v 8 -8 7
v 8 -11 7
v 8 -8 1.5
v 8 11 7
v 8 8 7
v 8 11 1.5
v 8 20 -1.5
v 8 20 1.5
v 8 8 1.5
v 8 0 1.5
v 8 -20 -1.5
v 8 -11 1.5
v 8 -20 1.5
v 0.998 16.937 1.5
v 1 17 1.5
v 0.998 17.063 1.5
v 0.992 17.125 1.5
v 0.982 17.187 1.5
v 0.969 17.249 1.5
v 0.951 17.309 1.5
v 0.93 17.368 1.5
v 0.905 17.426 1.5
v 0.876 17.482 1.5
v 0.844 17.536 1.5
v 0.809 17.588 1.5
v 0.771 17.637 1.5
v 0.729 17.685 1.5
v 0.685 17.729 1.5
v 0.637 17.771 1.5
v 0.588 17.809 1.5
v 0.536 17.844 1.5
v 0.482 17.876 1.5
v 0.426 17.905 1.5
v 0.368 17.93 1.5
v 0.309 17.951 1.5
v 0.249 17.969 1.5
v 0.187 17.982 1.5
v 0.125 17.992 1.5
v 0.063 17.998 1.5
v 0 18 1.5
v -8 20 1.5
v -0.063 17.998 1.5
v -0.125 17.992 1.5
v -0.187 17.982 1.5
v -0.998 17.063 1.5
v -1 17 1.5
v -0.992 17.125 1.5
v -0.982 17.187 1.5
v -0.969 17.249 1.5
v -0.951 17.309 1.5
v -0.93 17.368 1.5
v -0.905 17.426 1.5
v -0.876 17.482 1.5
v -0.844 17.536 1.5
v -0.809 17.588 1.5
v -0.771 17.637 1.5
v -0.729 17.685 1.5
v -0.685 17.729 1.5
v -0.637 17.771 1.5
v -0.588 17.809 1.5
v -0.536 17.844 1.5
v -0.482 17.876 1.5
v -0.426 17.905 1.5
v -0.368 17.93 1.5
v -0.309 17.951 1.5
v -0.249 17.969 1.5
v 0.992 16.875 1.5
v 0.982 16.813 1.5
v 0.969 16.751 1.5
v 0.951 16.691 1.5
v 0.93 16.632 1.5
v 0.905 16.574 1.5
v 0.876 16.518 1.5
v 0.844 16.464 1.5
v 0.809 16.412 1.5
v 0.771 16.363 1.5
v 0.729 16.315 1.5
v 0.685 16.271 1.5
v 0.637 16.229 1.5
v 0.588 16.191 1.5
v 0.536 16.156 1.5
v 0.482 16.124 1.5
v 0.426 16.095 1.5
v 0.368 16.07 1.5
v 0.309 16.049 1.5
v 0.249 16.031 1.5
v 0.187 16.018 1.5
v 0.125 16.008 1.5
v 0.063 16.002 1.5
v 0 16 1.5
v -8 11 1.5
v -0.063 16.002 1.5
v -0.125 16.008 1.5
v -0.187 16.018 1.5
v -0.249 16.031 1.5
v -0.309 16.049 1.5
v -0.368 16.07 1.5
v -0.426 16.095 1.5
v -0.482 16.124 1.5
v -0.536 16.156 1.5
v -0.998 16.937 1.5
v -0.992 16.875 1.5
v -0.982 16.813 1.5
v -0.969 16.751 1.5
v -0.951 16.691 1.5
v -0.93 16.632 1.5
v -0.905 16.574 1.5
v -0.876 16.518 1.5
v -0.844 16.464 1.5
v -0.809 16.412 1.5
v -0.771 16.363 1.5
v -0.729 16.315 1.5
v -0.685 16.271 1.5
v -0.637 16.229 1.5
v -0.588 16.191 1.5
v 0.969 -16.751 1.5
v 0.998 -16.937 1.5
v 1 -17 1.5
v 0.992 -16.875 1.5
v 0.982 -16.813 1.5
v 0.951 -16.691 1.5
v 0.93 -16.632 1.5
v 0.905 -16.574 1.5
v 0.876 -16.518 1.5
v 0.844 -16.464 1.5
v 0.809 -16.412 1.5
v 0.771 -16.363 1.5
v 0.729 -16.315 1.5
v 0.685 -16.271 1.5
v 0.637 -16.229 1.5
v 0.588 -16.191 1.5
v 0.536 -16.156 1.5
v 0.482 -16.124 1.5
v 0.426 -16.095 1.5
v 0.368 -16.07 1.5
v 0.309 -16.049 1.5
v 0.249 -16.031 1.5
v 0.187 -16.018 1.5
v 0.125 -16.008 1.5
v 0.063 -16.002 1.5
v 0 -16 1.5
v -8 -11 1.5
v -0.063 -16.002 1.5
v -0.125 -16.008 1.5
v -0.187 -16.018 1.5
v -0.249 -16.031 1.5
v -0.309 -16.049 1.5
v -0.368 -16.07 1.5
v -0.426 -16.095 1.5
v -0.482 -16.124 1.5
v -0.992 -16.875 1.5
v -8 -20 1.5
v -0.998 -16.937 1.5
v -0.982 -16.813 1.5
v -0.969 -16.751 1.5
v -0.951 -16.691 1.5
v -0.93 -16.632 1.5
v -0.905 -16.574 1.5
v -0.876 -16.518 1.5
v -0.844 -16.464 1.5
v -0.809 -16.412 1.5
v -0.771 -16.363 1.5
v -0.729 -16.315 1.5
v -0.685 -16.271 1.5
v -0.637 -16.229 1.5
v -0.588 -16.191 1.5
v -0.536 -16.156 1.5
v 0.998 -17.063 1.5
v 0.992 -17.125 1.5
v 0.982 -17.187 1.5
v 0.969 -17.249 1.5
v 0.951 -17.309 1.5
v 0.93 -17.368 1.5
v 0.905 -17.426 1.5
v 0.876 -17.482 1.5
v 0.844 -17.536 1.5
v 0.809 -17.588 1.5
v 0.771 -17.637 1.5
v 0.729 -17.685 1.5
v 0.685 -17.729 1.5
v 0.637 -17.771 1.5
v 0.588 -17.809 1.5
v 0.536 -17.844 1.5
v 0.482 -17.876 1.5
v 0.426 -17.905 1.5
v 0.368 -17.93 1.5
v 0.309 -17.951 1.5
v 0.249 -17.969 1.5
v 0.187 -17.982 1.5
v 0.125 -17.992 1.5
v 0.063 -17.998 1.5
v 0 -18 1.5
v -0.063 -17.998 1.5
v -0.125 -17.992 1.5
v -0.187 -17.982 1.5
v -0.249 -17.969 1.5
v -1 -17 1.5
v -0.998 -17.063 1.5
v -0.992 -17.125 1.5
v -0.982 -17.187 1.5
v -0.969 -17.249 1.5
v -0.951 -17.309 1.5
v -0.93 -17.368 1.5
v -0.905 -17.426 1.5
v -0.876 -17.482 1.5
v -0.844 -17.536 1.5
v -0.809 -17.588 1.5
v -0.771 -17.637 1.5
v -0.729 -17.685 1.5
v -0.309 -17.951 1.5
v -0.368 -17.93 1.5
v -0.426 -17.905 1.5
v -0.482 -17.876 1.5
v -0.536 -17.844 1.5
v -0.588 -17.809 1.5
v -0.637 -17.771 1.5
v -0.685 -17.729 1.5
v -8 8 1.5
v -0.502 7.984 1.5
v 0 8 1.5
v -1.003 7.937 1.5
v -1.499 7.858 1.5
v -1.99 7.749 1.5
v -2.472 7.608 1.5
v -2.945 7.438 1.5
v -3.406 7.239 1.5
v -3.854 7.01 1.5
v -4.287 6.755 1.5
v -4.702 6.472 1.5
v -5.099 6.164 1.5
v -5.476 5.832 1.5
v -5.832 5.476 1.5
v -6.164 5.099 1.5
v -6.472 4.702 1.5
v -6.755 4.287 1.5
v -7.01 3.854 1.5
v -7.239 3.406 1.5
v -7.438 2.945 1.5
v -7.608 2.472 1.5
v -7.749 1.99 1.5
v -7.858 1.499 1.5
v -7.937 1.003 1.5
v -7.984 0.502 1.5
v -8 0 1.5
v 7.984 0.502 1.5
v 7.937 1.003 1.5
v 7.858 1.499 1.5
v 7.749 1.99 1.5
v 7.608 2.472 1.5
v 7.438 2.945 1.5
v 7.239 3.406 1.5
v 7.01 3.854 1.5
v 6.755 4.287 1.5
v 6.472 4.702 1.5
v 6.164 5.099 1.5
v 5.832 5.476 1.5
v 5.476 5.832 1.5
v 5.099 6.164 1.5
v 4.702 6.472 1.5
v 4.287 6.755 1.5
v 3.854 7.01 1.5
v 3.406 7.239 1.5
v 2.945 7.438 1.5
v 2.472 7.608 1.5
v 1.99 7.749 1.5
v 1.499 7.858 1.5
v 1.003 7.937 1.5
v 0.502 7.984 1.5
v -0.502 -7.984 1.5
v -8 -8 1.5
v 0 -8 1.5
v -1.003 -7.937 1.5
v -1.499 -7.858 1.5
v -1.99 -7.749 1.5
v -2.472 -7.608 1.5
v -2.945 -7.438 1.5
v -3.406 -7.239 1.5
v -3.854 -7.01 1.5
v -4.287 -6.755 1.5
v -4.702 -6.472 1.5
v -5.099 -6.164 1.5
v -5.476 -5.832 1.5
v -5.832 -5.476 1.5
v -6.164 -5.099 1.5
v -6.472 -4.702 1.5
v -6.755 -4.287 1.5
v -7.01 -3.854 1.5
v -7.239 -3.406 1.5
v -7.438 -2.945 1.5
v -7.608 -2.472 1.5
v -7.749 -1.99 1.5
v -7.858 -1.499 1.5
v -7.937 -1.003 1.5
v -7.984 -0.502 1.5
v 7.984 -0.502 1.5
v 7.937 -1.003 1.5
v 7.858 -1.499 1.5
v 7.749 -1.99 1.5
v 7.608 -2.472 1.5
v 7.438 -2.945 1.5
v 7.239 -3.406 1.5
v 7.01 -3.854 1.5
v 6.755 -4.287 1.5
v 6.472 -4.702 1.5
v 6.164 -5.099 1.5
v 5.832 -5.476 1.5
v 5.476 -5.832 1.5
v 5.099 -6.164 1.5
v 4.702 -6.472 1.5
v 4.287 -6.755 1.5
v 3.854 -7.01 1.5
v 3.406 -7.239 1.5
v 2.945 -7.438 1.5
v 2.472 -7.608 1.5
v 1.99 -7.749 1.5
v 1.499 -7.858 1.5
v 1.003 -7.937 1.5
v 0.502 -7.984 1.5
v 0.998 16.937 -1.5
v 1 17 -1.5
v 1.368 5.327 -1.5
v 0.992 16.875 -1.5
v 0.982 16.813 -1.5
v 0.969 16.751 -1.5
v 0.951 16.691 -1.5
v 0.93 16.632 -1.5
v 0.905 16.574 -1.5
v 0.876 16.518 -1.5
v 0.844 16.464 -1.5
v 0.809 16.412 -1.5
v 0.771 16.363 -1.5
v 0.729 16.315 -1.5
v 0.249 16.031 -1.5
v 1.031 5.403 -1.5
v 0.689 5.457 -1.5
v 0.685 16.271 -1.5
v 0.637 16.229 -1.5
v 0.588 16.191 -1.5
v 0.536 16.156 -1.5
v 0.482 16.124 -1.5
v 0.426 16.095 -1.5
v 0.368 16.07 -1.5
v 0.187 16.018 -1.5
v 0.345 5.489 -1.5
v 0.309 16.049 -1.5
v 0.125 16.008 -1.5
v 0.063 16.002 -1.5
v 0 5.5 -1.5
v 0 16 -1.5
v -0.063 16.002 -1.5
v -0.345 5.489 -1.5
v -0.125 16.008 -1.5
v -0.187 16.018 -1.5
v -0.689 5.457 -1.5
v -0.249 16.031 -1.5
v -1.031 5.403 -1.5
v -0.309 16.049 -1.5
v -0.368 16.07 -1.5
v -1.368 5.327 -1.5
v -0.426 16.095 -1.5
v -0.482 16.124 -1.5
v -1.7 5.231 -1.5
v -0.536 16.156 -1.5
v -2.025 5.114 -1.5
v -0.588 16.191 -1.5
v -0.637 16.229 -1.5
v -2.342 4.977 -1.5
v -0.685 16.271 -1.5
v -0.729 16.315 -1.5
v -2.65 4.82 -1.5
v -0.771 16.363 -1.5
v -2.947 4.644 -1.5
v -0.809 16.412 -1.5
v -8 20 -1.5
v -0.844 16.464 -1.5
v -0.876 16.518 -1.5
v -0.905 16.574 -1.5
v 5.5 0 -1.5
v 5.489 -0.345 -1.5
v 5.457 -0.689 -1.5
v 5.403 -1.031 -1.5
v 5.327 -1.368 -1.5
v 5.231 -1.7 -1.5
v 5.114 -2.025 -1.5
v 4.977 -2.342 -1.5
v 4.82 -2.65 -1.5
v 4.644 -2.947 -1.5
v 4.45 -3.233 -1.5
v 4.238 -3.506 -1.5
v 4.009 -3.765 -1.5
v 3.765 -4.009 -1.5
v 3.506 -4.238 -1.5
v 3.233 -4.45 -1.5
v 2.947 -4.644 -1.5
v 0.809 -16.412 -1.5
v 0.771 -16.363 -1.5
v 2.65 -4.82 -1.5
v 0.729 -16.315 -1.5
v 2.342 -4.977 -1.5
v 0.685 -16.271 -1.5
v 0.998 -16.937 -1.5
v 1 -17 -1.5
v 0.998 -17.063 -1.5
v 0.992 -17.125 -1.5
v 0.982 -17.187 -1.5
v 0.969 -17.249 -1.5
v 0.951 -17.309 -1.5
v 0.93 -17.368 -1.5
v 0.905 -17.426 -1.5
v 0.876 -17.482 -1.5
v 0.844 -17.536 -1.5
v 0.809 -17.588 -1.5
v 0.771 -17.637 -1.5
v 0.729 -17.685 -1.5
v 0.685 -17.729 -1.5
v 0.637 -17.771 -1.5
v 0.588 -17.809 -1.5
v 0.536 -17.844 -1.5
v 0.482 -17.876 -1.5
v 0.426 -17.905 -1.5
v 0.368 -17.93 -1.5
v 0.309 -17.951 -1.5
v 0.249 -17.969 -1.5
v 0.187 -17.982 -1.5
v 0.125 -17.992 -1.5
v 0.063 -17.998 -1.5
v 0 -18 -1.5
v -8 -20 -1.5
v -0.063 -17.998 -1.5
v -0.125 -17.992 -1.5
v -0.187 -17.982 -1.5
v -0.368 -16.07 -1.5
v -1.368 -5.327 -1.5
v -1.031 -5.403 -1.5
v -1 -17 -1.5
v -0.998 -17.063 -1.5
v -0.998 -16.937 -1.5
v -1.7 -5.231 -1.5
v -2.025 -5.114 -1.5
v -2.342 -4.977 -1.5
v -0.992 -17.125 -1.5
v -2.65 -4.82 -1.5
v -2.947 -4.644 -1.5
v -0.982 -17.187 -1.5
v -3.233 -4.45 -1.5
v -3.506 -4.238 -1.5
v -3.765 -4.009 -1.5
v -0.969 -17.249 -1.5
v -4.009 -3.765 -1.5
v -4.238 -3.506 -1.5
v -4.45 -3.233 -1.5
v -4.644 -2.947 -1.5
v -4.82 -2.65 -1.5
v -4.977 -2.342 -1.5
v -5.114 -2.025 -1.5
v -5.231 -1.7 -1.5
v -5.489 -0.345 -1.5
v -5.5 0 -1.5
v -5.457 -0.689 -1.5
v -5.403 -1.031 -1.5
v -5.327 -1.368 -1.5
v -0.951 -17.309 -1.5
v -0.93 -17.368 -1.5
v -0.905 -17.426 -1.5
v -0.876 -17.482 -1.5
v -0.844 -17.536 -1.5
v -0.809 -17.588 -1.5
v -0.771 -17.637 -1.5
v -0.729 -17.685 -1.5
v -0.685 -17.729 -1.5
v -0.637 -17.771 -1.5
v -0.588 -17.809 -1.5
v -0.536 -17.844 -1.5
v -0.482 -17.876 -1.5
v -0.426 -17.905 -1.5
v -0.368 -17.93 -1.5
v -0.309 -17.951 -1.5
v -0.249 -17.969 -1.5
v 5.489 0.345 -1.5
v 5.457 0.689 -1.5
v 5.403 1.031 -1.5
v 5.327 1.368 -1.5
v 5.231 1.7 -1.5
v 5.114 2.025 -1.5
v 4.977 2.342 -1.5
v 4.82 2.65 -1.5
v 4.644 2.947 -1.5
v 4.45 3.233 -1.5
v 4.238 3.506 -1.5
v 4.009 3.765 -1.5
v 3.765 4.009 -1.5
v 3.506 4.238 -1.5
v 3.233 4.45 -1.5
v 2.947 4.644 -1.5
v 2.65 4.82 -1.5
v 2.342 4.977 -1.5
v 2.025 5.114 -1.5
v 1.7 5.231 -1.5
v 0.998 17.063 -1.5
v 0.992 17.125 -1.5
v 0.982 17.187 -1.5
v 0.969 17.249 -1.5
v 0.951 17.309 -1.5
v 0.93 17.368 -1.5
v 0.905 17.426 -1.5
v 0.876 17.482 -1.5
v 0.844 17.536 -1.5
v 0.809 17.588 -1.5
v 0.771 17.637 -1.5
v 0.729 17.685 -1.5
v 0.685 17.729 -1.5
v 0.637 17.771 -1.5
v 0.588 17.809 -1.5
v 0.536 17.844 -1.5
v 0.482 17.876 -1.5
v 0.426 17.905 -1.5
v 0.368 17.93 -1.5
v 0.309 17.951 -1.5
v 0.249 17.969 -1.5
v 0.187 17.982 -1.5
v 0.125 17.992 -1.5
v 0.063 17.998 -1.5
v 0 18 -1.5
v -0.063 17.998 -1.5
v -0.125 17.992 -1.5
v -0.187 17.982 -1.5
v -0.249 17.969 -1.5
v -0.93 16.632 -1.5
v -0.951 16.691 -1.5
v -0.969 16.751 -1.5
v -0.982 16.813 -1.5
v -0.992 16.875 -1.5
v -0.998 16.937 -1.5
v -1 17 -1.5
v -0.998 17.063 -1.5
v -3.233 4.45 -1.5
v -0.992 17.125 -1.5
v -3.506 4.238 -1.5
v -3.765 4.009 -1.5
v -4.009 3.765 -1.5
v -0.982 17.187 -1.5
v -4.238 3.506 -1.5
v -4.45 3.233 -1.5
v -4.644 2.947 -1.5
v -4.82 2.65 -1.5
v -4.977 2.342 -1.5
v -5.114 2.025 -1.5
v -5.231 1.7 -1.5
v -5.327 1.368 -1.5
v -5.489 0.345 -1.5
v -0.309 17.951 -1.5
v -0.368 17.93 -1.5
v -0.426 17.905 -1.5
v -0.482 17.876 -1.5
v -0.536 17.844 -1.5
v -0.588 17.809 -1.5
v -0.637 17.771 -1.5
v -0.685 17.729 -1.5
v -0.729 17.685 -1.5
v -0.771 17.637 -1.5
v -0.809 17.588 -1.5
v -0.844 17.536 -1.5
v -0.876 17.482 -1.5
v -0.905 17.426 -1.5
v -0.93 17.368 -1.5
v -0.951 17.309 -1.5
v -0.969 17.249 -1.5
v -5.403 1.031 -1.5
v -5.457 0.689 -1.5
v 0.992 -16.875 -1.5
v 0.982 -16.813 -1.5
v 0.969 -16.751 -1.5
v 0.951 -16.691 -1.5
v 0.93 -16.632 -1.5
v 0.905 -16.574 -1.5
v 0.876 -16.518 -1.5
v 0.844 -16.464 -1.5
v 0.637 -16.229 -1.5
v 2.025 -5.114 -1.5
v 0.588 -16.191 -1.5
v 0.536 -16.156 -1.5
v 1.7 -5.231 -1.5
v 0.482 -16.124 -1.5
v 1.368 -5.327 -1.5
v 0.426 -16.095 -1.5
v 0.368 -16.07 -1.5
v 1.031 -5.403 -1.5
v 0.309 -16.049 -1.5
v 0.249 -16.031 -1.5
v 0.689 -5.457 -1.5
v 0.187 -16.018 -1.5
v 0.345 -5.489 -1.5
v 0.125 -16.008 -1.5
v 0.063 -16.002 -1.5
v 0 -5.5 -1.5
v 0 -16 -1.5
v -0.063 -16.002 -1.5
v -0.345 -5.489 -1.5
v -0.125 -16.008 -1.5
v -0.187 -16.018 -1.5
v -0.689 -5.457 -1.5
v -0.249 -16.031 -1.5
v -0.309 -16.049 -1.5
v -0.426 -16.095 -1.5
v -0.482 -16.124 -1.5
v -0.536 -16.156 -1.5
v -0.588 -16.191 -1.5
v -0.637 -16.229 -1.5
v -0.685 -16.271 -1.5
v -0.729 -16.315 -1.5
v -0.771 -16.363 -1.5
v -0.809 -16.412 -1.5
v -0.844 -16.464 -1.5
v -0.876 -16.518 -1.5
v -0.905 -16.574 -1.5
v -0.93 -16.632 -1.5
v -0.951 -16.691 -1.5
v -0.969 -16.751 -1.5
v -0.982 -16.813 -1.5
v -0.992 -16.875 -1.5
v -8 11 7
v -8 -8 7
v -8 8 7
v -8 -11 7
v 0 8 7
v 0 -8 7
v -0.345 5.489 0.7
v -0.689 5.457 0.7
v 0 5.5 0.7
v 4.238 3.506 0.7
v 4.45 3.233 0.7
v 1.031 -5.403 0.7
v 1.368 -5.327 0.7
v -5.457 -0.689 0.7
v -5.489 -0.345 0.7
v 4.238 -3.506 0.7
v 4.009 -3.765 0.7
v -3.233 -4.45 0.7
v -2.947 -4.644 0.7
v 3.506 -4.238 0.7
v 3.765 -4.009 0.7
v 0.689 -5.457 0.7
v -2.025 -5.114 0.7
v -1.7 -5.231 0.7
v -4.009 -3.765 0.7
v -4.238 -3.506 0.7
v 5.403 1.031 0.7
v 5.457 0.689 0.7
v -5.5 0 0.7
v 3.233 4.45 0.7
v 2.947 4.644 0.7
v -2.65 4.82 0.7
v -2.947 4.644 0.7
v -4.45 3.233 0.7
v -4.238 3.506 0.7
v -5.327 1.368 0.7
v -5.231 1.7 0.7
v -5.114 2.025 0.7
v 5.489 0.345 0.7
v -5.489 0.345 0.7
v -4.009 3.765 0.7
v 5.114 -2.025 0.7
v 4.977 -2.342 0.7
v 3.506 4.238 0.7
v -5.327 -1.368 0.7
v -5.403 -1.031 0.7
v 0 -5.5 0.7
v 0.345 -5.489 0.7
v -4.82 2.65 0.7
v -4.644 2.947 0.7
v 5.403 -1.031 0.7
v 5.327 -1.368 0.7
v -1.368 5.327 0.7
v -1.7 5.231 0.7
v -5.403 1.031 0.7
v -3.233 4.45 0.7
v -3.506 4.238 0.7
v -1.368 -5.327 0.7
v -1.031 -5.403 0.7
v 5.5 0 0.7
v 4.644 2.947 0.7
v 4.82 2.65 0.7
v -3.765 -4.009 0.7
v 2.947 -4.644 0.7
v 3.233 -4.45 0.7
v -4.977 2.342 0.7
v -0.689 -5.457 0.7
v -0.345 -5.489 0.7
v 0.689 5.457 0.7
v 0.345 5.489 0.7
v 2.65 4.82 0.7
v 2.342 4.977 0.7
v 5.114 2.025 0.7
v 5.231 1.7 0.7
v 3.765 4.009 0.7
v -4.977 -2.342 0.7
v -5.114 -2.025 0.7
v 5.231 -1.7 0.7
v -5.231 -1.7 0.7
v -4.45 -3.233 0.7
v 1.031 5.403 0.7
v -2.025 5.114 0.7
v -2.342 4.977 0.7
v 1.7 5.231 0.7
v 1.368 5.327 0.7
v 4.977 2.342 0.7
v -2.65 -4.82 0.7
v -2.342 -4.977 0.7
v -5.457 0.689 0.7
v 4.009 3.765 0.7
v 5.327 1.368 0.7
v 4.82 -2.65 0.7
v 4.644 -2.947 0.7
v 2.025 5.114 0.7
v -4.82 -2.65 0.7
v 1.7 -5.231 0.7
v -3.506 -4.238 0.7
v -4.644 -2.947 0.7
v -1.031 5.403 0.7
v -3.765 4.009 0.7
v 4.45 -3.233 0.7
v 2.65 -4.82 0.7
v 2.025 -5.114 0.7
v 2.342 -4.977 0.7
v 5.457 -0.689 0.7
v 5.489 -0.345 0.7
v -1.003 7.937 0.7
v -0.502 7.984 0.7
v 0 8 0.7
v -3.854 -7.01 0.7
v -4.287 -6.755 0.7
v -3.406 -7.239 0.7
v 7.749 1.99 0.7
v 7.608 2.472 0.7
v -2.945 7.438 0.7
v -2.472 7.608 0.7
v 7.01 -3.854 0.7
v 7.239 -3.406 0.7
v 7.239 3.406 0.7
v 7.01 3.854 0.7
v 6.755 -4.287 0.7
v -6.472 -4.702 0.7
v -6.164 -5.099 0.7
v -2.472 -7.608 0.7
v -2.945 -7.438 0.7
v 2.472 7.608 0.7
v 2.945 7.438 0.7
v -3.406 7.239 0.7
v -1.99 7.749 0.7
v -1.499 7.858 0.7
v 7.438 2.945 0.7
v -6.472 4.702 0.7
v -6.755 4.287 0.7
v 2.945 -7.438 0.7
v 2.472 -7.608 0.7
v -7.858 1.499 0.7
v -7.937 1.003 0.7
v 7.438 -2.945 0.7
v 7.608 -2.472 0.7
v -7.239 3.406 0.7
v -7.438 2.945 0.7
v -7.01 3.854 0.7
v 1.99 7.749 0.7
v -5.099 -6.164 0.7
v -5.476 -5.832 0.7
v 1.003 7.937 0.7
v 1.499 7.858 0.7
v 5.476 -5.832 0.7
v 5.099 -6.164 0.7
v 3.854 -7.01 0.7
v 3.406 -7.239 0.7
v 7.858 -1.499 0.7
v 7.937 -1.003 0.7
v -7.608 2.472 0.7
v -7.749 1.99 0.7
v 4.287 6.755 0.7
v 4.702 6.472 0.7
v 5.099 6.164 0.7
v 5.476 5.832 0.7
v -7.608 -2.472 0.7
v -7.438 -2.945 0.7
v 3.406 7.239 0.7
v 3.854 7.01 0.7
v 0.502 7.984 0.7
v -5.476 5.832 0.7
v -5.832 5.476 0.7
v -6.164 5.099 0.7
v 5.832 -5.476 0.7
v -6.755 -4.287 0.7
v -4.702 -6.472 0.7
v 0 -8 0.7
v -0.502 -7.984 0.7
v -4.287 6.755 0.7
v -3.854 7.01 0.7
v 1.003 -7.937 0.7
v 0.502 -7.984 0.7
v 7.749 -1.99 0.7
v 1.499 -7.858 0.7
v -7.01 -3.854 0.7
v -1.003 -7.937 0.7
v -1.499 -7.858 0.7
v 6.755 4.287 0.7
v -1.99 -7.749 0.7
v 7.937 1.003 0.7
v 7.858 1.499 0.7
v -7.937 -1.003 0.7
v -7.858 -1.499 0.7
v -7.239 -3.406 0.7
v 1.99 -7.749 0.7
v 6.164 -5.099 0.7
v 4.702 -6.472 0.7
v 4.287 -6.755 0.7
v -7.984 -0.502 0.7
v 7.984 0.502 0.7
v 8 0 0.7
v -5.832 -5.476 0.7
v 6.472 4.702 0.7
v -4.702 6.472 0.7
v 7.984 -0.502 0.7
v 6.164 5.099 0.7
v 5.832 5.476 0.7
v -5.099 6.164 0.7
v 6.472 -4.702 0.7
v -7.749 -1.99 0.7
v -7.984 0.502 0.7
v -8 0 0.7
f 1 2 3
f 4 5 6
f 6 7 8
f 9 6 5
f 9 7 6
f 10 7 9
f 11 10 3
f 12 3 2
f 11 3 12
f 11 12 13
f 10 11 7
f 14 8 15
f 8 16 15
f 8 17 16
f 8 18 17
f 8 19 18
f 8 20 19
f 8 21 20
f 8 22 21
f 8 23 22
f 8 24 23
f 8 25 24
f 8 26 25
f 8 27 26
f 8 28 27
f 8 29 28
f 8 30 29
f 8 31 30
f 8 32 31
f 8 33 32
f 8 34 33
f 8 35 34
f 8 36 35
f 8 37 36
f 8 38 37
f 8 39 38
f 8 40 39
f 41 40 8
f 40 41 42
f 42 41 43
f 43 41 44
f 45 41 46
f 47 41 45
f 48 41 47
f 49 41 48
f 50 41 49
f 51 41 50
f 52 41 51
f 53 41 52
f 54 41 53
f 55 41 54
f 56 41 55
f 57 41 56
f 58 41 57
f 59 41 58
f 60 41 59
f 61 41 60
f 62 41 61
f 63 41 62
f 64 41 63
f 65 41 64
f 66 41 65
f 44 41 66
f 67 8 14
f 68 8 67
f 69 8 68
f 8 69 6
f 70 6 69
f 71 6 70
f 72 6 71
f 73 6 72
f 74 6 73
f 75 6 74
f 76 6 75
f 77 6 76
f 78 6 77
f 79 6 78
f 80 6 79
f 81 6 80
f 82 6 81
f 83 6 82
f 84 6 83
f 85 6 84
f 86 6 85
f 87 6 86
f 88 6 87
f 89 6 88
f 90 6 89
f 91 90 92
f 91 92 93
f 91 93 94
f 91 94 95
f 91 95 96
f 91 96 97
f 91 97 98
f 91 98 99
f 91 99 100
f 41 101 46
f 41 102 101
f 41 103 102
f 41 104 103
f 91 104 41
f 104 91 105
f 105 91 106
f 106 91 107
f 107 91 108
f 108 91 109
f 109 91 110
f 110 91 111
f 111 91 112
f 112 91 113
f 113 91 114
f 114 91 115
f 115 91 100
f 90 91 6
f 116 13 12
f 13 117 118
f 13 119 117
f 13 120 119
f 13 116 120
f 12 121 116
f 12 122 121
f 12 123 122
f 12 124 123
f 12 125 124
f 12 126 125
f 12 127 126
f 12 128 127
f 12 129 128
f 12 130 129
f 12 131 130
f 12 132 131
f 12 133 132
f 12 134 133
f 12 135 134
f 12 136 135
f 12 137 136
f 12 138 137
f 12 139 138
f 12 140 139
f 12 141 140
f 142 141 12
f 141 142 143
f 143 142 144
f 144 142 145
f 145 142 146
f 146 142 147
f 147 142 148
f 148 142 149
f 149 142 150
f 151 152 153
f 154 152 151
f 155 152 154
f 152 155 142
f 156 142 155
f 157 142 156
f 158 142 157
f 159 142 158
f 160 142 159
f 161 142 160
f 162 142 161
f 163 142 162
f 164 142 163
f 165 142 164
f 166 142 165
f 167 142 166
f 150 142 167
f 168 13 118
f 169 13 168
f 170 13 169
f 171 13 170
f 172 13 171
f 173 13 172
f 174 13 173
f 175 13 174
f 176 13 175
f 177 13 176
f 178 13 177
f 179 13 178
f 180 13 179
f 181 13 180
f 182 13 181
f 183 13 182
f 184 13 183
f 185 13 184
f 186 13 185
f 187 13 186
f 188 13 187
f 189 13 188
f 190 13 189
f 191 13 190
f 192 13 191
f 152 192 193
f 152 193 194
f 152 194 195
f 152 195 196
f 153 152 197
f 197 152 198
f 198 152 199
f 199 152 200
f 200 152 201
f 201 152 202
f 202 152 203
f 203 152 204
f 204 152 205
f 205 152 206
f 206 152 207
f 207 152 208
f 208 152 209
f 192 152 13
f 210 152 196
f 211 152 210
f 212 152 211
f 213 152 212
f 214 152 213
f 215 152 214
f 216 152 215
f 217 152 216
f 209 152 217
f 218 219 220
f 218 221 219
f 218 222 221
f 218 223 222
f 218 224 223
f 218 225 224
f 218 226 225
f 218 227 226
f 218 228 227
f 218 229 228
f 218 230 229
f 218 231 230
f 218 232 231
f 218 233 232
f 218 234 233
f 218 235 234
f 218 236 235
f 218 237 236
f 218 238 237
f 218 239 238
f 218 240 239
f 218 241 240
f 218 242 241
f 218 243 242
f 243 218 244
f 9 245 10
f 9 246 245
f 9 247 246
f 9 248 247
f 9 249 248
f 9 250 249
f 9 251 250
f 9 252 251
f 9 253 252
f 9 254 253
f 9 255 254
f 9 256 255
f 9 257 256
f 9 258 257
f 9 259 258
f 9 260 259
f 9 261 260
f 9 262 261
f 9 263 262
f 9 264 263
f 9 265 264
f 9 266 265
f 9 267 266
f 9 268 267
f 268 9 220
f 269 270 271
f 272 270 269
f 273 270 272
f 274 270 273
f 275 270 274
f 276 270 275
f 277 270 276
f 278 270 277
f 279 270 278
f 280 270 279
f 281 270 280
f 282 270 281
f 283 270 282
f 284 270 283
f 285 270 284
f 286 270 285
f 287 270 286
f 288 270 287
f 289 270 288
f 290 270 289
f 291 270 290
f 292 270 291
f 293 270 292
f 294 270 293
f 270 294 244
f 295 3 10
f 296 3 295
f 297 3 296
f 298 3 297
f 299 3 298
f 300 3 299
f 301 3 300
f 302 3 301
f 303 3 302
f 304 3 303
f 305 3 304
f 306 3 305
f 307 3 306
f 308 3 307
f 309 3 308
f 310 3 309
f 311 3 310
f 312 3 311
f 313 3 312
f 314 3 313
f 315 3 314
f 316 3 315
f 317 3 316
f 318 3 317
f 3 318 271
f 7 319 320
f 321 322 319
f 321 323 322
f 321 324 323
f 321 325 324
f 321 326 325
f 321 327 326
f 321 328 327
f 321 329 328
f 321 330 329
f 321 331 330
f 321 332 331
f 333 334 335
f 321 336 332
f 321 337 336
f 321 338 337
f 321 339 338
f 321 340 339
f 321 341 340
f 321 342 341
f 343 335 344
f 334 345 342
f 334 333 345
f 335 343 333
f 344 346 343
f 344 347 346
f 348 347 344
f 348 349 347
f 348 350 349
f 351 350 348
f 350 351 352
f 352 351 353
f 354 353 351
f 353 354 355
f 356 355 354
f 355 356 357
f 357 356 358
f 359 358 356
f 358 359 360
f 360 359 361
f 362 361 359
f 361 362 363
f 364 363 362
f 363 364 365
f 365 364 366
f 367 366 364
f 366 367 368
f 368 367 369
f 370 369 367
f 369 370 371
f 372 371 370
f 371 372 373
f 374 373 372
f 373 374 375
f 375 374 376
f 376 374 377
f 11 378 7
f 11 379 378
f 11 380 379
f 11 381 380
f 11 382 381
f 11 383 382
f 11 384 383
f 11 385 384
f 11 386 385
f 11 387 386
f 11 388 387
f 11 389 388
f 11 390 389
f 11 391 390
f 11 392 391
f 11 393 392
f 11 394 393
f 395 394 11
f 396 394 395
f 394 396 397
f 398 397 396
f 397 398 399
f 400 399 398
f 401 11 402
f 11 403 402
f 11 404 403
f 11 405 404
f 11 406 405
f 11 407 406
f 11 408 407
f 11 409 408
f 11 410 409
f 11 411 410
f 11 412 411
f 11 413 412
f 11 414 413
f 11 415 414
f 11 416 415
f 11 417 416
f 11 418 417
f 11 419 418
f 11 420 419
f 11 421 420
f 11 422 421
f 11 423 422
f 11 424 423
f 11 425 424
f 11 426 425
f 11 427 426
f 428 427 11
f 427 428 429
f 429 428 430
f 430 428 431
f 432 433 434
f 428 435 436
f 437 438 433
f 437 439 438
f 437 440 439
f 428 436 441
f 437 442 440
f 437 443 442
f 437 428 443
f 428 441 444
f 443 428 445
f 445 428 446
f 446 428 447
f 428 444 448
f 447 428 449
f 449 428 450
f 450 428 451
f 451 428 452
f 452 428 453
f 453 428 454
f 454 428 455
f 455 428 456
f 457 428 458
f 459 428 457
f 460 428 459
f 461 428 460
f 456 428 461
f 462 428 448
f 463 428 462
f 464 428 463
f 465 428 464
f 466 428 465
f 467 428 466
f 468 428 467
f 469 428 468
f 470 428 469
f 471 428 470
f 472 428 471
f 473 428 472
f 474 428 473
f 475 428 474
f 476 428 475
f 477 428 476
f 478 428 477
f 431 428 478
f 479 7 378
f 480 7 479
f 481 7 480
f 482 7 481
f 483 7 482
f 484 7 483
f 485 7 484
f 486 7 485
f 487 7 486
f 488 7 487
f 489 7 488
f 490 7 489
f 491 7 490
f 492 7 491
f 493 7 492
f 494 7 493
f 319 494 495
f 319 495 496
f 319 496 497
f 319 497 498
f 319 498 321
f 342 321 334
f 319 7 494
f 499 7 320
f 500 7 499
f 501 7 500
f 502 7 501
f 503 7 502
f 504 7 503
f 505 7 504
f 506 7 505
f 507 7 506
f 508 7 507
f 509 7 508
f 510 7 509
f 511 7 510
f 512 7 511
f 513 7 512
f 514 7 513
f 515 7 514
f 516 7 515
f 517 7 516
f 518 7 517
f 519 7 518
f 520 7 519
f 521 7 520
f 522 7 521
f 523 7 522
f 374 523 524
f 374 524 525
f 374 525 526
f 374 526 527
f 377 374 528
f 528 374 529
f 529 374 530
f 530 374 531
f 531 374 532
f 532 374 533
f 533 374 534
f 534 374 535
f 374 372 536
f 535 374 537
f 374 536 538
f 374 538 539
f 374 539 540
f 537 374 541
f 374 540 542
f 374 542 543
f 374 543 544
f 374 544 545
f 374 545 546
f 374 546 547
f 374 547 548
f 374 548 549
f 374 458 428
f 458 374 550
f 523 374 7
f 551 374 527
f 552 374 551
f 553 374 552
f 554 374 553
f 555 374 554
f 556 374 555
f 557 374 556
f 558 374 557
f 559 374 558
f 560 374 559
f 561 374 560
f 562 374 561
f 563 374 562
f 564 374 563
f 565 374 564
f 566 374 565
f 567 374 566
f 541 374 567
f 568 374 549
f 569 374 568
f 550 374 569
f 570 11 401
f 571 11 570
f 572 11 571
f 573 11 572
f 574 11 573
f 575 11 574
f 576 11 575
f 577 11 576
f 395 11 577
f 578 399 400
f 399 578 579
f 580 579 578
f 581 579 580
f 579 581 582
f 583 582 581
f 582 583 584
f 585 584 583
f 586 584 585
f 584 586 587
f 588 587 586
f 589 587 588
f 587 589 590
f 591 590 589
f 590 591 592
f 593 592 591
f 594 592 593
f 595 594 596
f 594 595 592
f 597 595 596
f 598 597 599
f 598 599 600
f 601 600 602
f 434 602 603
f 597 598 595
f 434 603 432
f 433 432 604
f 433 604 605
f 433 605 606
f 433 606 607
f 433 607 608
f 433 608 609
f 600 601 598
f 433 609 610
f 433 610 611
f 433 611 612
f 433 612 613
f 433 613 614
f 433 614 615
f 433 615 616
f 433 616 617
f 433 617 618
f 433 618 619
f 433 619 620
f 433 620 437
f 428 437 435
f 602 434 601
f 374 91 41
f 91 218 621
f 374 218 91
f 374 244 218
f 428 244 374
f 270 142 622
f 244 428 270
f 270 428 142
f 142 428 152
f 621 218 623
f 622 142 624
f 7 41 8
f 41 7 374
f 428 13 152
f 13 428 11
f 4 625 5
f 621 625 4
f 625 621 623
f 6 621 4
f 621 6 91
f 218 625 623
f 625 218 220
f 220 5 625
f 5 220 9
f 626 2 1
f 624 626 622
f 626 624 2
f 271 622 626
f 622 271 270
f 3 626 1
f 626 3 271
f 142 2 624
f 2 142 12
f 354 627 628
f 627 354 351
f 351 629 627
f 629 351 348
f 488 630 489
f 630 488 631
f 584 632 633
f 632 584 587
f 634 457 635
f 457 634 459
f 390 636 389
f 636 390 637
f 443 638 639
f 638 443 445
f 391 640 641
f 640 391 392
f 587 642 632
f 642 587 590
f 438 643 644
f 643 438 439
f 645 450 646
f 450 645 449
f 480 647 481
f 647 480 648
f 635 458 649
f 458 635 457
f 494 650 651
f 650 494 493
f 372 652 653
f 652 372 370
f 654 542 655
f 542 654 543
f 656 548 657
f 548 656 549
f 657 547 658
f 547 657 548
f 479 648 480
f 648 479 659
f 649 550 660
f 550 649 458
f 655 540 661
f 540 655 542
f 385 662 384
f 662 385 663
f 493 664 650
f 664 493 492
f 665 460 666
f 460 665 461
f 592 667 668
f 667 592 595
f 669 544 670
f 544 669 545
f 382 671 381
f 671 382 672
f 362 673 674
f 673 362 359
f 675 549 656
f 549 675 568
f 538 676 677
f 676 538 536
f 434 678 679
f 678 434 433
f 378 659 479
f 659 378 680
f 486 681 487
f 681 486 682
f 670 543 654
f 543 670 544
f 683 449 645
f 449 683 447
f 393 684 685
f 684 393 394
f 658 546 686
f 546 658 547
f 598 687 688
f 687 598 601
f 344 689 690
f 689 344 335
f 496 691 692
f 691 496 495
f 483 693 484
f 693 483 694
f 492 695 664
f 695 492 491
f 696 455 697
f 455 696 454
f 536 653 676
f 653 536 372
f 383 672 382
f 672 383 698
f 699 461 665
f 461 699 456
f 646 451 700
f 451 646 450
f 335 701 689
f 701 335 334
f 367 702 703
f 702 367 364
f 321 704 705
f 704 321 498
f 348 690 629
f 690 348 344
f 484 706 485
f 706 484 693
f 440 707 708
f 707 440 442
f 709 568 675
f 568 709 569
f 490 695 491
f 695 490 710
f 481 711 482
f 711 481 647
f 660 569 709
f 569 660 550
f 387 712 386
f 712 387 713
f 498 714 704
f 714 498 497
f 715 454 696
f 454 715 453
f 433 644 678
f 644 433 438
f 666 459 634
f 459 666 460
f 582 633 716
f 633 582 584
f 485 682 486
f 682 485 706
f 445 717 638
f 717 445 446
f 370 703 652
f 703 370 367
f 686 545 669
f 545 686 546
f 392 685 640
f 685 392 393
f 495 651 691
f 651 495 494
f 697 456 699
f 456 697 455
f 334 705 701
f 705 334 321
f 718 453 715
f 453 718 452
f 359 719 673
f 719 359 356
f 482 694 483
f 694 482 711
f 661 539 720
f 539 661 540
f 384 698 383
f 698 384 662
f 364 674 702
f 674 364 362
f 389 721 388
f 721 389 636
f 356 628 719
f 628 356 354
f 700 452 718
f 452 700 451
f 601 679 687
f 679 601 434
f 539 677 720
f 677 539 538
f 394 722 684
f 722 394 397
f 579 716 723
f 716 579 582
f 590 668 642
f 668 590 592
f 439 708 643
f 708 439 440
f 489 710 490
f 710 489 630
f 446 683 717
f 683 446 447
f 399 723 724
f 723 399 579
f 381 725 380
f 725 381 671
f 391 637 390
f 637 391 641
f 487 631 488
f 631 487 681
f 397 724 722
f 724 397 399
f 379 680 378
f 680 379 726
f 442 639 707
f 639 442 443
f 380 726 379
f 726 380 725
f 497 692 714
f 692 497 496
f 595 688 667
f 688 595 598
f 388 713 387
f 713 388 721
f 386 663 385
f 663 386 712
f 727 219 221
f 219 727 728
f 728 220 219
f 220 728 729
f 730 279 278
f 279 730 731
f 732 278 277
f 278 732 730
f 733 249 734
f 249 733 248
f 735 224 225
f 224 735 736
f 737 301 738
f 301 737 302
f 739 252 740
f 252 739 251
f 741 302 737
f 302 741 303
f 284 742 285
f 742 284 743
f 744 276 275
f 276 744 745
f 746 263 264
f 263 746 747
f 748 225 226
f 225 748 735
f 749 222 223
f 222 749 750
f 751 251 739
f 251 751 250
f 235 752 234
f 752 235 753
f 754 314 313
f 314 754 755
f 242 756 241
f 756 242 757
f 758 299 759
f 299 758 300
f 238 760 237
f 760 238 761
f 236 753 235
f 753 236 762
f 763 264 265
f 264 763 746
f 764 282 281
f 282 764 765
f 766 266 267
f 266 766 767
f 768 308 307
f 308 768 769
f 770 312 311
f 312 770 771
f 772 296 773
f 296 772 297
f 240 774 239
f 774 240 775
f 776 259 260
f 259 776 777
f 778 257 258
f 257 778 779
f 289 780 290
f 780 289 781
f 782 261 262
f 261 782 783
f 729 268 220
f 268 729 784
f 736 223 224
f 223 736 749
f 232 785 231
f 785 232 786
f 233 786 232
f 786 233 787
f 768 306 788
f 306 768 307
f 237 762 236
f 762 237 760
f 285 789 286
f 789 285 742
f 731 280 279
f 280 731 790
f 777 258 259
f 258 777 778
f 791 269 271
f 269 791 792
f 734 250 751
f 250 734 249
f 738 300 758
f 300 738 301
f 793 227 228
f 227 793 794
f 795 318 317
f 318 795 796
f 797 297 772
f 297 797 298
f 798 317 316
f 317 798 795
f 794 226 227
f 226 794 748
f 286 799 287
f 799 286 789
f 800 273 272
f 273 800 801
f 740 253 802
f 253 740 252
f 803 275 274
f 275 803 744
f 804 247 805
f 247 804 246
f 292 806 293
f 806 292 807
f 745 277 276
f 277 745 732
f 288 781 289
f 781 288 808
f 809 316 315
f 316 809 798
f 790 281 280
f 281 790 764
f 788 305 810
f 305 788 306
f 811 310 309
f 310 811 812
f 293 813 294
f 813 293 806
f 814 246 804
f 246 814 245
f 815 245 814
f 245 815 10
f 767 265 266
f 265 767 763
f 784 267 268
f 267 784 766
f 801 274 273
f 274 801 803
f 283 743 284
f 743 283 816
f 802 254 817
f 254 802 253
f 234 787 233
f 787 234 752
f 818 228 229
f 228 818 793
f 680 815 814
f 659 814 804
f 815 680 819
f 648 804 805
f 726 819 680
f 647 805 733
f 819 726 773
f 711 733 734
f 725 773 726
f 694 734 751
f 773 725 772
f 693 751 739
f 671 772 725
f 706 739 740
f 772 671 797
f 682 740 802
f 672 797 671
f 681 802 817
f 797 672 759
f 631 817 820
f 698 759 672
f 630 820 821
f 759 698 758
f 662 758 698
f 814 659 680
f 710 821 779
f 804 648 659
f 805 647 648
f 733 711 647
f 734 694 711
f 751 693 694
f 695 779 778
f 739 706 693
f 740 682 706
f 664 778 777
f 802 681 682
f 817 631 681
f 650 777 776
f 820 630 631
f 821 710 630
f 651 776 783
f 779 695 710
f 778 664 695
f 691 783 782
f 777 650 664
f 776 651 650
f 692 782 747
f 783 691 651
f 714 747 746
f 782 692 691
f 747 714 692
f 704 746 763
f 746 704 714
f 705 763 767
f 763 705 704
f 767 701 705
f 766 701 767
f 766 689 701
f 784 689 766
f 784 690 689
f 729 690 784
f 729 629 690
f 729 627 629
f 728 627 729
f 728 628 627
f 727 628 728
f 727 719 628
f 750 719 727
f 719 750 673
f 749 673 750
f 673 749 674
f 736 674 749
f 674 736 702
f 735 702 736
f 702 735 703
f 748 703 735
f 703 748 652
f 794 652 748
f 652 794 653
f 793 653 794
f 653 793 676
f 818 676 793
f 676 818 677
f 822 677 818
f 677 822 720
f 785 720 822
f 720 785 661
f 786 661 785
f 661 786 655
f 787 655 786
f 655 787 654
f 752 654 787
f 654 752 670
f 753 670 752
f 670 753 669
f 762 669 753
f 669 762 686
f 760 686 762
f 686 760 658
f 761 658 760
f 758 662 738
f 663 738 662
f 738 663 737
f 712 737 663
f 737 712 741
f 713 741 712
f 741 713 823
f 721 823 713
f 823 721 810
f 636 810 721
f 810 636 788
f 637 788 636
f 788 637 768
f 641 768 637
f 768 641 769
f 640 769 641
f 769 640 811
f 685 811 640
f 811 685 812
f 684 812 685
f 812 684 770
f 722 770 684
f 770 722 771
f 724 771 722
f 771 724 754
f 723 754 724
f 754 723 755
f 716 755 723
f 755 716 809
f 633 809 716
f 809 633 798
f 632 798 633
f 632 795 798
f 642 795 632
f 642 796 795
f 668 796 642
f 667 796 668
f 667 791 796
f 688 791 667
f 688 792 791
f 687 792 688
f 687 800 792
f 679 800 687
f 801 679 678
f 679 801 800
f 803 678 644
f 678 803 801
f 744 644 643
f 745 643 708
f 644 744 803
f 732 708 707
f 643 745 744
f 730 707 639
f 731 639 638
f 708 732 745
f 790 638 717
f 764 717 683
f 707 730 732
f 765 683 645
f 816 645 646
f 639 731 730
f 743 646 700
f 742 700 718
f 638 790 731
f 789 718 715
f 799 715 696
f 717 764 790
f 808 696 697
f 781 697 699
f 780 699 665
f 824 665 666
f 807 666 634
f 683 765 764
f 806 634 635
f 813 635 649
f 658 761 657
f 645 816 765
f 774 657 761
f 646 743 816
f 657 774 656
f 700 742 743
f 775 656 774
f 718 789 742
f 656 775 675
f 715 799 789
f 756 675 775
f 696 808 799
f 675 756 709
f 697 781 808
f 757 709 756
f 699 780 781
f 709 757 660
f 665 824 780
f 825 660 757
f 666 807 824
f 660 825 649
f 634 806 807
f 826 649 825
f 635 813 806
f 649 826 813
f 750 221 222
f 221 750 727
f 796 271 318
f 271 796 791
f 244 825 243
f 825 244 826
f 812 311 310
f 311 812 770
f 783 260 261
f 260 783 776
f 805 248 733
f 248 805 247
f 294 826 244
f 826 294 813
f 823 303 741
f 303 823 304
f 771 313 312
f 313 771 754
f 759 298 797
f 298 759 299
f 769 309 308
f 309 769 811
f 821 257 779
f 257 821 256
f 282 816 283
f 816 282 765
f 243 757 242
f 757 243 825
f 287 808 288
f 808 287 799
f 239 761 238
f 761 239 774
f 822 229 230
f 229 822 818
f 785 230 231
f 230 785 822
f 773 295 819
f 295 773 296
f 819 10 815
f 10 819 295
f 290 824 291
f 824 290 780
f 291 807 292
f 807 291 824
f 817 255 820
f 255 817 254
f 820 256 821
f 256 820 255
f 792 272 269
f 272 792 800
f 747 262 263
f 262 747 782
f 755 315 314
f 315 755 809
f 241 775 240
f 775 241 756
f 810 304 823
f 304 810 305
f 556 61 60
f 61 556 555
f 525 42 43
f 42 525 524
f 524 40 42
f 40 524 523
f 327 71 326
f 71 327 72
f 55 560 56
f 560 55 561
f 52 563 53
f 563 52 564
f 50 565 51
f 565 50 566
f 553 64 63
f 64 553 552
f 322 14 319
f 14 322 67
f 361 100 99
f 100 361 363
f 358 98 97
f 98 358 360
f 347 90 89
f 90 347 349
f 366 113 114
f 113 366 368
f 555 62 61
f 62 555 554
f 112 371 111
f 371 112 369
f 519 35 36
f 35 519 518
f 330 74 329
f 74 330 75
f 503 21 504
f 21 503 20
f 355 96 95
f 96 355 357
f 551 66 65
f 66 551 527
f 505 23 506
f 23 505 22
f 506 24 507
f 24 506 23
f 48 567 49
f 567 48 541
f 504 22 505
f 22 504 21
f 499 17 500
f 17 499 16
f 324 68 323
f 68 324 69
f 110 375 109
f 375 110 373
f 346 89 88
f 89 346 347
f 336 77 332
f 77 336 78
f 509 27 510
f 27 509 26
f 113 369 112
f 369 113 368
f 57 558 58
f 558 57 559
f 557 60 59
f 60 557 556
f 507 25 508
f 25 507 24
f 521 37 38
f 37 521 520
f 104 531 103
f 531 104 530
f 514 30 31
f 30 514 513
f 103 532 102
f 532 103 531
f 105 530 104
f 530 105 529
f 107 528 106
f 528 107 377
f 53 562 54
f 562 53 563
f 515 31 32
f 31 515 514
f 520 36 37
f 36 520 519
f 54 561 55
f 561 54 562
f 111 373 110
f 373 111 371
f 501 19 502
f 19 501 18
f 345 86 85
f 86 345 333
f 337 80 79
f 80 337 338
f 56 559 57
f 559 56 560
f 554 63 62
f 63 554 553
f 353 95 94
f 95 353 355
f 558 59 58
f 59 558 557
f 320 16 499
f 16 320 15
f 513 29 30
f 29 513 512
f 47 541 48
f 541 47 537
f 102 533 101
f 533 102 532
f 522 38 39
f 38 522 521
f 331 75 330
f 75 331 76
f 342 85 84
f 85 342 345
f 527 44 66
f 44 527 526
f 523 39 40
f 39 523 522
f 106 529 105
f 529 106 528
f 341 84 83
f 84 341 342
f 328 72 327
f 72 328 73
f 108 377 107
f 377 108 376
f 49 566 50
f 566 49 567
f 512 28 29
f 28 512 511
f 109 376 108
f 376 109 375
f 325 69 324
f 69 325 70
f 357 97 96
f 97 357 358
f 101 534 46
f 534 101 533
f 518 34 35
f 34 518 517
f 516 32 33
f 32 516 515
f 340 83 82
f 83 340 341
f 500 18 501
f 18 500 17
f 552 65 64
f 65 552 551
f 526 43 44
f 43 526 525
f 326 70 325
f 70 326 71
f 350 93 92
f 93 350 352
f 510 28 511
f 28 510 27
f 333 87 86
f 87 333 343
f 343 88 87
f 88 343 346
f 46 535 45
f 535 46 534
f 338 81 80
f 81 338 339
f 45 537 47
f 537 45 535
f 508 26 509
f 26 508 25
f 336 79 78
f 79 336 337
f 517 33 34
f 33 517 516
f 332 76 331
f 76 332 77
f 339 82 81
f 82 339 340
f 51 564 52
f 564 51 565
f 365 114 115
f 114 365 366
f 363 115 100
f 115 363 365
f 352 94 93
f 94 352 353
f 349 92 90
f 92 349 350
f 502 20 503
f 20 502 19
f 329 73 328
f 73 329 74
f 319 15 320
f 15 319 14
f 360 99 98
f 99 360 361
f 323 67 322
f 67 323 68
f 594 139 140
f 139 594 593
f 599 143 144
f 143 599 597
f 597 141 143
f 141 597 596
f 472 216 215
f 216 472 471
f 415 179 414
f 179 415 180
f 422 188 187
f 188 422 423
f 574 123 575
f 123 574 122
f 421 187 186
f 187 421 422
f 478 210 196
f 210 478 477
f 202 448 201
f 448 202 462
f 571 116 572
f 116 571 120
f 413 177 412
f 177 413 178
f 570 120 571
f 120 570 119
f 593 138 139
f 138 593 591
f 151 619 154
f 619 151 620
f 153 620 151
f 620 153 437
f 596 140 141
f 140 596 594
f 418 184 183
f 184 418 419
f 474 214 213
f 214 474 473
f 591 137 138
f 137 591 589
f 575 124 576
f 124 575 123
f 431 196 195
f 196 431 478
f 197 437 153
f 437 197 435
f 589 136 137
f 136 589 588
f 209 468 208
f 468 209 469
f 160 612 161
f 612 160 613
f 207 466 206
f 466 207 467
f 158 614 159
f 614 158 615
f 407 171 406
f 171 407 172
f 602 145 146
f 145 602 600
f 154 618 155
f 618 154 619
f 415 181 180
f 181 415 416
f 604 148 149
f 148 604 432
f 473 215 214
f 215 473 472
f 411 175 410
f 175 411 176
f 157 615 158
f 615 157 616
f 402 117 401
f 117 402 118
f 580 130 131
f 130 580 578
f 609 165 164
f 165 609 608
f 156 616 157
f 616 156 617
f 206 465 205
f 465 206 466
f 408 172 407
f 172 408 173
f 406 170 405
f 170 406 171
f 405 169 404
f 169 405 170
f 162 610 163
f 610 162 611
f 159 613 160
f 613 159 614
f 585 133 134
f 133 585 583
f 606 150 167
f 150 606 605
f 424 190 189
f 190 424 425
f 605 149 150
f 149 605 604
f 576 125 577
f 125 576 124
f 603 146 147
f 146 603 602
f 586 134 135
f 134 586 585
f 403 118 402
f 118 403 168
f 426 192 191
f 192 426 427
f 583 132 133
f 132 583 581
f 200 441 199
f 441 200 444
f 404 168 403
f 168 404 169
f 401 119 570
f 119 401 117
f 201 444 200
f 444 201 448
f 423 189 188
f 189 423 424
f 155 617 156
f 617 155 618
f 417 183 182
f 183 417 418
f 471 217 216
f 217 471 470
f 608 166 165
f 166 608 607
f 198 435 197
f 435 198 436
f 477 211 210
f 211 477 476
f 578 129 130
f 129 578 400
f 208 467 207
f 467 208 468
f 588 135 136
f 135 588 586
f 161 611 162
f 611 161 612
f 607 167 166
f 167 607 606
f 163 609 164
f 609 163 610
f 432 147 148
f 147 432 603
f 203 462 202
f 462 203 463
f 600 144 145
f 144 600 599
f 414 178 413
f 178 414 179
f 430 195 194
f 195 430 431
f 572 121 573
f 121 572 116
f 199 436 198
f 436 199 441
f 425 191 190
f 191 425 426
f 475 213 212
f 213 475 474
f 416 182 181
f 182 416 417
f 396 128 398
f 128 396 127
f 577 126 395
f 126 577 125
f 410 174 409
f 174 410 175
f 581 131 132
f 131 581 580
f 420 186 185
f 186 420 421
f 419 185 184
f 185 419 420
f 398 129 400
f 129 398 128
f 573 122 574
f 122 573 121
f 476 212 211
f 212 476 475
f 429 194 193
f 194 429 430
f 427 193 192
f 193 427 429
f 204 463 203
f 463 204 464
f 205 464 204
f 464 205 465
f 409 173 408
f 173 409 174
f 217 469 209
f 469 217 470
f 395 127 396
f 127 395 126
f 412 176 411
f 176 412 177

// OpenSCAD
difference(){
	union(){
        
       translate([0,0,0]){
           cube([16,40,3], center=true);
       }
        translate([0,1.5+16/2,3]){
           cube([16,3,8], center=true);
       }
        translate([0,-1.5-16/2,3]){
           cube([16,3,8], center=true);
       }

	}
	union() {
       translate([0,0,0]){
            rotate(a = [0,0,90]) {
              cylinder(h=600, r=5.5, $fn=100, center=true);
            }
       }		   
       translate([0,0,0.7]){
            rotate(a = [0,0,90]) {
              cylinder(h=600, r=8, $fn=100, center=false);
            }
       }		       
       translate([0,17,0]){
            rotate(a = [0,0,90]) {
              cylinder(h=600, r=1, $fn=100, center=true);
            }
       }			   
       translate([0,-17,0]){
            rotate(a = [0,0,90]) {
              cylinder(h=600, r=1, $fn=100, center=true);
            }
       }			   
		   

        
	}
}
